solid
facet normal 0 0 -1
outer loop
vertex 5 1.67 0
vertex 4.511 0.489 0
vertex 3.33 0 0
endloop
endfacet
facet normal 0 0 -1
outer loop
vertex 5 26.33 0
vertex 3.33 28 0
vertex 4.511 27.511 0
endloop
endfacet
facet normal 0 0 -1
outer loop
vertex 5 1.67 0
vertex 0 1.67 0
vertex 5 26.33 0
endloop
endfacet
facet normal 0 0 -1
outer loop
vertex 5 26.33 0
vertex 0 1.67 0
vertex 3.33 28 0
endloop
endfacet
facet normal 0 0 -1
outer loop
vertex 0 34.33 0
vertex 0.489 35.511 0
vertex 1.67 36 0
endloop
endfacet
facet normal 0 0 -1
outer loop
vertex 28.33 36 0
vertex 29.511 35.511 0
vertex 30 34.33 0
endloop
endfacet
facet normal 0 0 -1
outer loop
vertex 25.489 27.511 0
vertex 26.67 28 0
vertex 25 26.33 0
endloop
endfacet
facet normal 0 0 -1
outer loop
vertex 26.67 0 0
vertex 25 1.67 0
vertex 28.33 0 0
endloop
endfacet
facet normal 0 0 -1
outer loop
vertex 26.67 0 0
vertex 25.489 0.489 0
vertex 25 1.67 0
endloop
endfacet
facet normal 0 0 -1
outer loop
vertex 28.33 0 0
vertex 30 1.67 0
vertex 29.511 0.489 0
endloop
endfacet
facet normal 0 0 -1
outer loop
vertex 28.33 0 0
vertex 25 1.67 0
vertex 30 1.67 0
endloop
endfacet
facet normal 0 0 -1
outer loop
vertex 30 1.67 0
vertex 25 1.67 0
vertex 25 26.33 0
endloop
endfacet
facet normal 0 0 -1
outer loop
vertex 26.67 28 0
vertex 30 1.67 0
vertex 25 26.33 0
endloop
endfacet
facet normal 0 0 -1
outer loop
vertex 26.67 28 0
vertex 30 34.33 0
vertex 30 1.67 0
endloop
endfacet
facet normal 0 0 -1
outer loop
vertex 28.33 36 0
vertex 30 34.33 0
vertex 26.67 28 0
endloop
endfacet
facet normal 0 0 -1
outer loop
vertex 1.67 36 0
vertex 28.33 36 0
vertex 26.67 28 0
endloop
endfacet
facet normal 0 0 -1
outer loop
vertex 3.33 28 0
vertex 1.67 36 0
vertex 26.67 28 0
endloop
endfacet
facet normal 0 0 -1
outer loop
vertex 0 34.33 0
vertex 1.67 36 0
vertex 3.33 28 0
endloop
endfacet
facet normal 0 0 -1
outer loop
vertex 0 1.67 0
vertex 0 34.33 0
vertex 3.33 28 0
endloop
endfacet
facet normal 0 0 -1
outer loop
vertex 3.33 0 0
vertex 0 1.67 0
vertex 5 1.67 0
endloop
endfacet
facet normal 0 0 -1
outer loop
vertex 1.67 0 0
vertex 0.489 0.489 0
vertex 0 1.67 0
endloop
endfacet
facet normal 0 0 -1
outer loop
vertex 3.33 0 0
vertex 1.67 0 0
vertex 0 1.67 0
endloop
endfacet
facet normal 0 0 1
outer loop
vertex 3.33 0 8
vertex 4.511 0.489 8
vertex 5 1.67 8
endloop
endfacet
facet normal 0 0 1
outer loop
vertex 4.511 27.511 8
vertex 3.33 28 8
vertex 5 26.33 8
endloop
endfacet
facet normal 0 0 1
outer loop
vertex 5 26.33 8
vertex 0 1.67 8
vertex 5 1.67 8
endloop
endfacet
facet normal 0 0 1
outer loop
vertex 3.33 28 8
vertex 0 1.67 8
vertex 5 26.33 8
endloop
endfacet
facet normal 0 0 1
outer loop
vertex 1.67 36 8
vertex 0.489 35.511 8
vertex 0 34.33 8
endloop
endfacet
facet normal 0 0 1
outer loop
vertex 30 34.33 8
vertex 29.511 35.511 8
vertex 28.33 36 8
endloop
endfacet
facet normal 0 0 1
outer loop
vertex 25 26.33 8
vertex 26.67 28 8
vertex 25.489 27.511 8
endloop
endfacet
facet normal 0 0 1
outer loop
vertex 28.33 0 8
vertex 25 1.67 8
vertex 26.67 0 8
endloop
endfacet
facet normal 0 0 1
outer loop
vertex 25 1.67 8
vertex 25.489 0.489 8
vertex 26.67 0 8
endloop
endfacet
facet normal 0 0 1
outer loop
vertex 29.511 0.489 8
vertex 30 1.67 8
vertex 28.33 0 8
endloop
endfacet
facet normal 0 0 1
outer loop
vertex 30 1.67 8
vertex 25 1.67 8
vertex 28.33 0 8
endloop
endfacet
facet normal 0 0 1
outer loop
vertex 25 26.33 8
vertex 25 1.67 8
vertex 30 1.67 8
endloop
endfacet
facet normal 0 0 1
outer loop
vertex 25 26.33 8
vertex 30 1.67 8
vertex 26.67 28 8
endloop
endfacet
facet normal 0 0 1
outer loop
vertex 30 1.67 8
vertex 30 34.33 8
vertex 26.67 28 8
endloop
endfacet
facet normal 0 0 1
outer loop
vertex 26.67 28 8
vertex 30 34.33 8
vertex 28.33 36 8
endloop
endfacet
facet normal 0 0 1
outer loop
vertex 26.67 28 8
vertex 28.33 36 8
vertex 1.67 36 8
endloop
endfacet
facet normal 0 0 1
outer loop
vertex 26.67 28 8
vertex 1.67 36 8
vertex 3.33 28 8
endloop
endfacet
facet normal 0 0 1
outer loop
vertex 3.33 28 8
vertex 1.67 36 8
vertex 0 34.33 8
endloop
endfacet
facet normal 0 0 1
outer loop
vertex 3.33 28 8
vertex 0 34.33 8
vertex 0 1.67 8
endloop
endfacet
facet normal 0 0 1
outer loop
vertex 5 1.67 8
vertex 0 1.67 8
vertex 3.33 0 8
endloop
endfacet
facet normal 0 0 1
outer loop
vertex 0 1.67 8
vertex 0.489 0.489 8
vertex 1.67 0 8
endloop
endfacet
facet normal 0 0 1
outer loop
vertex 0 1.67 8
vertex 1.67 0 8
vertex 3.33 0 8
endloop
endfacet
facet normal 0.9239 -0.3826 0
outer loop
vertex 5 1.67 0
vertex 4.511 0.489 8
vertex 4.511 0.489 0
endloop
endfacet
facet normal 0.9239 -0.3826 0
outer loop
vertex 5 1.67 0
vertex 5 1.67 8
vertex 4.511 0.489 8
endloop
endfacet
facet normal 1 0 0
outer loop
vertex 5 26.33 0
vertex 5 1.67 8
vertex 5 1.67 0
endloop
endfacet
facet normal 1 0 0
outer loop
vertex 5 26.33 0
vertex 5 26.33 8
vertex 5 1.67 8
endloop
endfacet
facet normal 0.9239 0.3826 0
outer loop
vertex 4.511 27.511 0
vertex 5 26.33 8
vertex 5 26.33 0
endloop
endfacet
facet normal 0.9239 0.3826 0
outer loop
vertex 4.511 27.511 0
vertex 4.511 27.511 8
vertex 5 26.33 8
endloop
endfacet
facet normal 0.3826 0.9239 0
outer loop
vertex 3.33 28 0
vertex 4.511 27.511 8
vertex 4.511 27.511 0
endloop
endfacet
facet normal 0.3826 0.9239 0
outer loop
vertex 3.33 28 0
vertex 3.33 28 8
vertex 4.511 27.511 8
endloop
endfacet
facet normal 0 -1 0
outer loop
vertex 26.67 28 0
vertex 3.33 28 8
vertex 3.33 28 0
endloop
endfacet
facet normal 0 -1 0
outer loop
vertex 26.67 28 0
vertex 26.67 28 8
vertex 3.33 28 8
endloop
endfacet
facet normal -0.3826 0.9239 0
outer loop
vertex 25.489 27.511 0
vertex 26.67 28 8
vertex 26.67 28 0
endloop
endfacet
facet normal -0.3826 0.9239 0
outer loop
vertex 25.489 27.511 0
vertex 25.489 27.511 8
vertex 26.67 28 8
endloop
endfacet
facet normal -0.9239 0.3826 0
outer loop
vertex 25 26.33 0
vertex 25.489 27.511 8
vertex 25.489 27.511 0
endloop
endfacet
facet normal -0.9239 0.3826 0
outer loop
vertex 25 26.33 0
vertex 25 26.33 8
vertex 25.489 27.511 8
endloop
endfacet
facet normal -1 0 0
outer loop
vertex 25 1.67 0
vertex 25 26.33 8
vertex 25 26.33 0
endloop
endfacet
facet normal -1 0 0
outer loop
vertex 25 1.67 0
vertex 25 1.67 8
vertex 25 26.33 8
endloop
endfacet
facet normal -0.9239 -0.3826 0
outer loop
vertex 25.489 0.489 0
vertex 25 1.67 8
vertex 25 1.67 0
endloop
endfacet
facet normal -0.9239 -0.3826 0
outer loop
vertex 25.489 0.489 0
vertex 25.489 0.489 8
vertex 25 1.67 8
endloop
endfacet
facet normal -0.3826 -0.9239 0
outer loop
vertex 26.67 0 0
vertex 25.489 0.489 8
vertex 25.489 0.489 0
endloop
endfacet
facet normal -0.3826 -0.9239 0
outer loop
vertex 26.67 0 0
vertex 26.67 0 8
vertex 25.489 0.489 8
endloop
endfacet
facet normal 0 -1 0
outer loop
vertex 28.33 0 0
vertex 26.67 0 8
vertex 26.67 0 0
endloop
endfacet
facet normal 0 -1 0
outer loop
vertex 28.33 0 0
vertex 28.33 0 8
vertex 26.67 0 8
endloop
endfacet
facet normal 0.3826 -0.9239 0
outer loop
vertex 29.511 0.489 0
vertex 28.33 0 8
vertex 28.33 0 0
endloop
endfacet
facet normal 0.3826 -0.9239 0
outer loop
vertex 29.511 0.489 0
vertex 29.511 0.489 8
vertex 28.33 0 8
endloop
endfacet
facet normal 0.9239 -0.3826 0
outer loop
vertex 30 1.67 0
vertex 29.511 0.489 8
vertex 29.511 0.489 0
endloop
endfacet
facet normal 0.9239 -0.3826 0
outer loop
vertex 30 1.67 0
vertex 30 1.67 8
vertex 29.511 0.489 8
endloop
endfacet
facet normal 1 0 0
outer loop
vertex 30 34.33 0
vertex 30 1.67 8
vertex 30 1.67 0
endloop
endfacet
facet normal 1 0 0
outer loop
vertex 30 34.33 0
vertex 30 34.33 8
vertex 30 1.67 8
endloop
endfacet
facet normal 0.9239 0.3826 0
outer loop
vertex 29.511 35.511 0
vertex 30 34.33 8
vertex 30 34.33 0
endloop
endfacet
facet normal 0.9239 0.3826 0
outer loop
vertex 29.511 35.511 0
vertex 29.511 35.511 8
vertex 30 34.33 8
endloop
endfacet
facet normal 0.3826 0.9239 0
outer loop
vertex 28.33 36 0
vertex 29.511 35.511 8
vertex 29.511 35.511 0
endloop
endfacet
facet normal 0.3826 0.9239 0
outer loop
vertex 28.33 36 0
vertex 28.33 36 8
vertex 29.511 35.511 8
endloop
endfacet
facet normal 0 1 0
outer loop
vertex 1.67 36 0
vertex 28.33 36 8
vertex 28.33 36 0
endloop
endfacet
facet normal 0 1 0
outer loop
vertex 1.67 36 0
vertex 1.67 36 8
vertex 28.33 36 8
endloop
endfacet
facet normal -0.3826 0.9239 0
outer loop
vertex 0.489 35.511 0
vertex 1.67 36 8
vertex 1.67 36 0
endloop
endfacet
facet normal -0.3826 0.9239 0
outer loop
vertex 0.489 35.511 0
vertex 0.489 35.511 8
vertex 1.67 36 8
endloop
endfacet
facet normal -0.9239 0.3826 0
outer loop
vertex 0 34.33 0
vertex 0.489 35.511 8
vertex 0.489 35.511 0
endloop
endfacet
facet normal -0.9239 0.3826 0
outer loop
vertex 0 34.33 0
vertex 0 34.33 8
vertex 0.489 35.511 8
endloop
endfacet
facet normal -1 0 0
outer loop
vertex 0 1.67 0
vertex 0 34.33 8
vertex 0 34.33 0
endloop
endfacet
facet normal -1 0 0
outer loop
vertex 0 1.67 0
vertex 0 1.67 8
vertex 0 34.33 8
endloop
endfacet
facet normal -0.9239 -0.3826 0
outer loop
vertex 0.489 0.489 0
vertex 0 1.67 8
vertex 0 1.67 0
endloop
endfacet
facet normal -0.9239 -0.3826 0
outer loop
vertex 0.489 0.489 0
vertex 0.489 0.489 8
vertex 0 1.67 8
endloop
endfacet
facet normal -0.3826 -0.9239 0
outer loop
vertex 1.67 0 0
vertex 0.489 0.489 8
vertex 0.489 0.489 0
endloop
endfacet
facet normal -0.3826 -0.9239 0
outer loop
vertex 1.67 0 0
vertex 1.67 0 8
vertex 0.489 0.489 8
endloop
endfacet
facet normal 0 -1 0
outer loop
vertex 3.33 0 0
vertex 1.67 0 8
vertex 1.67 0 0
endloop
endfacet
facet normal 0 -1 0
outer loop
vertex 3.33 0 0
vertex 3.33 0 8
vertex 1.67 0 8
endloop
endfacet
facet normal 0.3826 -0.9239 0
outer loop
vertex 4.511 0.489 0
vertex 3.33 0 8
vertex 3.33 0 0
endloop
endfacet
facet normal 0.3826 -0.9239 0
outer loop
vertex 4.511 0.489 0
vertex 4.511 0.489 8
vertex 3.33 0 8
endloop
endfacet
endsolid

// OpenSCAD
$fn = 32;

// ----------------------------------------------------------------------
// Clip blank: staple clip, 8 mm thick
// ----------------------------------------------------------------------

// --- parameters (mm) ---
profile_height = 8;       // extrusion height
profile_points = 24;      // points of the closed outline

profile = [[0, 1.67], [0.489, 0.489], [1.67, 0], [3.33, 0], [4.511, 0.489], [5, 1.67], [5, 26.33], [4.511, 27.511], [3.33, 28], [26.67, 28], [25.489, 27.511], [25, 26.33], [25, 1.67], [25.489, 0.489], [26.67, 0], [28.33, 0], [29.511, 0.489], [30, 1.67], [30, 34.33], [29.511, 35.511], [28.33, 36], [1.67, 36], [0.489, 35.511], [0, 34.33]];  // single closed polygon, 24 points, counter clockwise

// --- the one profile operation ---
linear_extrude(height = profile_height) polygon(points = profile);
